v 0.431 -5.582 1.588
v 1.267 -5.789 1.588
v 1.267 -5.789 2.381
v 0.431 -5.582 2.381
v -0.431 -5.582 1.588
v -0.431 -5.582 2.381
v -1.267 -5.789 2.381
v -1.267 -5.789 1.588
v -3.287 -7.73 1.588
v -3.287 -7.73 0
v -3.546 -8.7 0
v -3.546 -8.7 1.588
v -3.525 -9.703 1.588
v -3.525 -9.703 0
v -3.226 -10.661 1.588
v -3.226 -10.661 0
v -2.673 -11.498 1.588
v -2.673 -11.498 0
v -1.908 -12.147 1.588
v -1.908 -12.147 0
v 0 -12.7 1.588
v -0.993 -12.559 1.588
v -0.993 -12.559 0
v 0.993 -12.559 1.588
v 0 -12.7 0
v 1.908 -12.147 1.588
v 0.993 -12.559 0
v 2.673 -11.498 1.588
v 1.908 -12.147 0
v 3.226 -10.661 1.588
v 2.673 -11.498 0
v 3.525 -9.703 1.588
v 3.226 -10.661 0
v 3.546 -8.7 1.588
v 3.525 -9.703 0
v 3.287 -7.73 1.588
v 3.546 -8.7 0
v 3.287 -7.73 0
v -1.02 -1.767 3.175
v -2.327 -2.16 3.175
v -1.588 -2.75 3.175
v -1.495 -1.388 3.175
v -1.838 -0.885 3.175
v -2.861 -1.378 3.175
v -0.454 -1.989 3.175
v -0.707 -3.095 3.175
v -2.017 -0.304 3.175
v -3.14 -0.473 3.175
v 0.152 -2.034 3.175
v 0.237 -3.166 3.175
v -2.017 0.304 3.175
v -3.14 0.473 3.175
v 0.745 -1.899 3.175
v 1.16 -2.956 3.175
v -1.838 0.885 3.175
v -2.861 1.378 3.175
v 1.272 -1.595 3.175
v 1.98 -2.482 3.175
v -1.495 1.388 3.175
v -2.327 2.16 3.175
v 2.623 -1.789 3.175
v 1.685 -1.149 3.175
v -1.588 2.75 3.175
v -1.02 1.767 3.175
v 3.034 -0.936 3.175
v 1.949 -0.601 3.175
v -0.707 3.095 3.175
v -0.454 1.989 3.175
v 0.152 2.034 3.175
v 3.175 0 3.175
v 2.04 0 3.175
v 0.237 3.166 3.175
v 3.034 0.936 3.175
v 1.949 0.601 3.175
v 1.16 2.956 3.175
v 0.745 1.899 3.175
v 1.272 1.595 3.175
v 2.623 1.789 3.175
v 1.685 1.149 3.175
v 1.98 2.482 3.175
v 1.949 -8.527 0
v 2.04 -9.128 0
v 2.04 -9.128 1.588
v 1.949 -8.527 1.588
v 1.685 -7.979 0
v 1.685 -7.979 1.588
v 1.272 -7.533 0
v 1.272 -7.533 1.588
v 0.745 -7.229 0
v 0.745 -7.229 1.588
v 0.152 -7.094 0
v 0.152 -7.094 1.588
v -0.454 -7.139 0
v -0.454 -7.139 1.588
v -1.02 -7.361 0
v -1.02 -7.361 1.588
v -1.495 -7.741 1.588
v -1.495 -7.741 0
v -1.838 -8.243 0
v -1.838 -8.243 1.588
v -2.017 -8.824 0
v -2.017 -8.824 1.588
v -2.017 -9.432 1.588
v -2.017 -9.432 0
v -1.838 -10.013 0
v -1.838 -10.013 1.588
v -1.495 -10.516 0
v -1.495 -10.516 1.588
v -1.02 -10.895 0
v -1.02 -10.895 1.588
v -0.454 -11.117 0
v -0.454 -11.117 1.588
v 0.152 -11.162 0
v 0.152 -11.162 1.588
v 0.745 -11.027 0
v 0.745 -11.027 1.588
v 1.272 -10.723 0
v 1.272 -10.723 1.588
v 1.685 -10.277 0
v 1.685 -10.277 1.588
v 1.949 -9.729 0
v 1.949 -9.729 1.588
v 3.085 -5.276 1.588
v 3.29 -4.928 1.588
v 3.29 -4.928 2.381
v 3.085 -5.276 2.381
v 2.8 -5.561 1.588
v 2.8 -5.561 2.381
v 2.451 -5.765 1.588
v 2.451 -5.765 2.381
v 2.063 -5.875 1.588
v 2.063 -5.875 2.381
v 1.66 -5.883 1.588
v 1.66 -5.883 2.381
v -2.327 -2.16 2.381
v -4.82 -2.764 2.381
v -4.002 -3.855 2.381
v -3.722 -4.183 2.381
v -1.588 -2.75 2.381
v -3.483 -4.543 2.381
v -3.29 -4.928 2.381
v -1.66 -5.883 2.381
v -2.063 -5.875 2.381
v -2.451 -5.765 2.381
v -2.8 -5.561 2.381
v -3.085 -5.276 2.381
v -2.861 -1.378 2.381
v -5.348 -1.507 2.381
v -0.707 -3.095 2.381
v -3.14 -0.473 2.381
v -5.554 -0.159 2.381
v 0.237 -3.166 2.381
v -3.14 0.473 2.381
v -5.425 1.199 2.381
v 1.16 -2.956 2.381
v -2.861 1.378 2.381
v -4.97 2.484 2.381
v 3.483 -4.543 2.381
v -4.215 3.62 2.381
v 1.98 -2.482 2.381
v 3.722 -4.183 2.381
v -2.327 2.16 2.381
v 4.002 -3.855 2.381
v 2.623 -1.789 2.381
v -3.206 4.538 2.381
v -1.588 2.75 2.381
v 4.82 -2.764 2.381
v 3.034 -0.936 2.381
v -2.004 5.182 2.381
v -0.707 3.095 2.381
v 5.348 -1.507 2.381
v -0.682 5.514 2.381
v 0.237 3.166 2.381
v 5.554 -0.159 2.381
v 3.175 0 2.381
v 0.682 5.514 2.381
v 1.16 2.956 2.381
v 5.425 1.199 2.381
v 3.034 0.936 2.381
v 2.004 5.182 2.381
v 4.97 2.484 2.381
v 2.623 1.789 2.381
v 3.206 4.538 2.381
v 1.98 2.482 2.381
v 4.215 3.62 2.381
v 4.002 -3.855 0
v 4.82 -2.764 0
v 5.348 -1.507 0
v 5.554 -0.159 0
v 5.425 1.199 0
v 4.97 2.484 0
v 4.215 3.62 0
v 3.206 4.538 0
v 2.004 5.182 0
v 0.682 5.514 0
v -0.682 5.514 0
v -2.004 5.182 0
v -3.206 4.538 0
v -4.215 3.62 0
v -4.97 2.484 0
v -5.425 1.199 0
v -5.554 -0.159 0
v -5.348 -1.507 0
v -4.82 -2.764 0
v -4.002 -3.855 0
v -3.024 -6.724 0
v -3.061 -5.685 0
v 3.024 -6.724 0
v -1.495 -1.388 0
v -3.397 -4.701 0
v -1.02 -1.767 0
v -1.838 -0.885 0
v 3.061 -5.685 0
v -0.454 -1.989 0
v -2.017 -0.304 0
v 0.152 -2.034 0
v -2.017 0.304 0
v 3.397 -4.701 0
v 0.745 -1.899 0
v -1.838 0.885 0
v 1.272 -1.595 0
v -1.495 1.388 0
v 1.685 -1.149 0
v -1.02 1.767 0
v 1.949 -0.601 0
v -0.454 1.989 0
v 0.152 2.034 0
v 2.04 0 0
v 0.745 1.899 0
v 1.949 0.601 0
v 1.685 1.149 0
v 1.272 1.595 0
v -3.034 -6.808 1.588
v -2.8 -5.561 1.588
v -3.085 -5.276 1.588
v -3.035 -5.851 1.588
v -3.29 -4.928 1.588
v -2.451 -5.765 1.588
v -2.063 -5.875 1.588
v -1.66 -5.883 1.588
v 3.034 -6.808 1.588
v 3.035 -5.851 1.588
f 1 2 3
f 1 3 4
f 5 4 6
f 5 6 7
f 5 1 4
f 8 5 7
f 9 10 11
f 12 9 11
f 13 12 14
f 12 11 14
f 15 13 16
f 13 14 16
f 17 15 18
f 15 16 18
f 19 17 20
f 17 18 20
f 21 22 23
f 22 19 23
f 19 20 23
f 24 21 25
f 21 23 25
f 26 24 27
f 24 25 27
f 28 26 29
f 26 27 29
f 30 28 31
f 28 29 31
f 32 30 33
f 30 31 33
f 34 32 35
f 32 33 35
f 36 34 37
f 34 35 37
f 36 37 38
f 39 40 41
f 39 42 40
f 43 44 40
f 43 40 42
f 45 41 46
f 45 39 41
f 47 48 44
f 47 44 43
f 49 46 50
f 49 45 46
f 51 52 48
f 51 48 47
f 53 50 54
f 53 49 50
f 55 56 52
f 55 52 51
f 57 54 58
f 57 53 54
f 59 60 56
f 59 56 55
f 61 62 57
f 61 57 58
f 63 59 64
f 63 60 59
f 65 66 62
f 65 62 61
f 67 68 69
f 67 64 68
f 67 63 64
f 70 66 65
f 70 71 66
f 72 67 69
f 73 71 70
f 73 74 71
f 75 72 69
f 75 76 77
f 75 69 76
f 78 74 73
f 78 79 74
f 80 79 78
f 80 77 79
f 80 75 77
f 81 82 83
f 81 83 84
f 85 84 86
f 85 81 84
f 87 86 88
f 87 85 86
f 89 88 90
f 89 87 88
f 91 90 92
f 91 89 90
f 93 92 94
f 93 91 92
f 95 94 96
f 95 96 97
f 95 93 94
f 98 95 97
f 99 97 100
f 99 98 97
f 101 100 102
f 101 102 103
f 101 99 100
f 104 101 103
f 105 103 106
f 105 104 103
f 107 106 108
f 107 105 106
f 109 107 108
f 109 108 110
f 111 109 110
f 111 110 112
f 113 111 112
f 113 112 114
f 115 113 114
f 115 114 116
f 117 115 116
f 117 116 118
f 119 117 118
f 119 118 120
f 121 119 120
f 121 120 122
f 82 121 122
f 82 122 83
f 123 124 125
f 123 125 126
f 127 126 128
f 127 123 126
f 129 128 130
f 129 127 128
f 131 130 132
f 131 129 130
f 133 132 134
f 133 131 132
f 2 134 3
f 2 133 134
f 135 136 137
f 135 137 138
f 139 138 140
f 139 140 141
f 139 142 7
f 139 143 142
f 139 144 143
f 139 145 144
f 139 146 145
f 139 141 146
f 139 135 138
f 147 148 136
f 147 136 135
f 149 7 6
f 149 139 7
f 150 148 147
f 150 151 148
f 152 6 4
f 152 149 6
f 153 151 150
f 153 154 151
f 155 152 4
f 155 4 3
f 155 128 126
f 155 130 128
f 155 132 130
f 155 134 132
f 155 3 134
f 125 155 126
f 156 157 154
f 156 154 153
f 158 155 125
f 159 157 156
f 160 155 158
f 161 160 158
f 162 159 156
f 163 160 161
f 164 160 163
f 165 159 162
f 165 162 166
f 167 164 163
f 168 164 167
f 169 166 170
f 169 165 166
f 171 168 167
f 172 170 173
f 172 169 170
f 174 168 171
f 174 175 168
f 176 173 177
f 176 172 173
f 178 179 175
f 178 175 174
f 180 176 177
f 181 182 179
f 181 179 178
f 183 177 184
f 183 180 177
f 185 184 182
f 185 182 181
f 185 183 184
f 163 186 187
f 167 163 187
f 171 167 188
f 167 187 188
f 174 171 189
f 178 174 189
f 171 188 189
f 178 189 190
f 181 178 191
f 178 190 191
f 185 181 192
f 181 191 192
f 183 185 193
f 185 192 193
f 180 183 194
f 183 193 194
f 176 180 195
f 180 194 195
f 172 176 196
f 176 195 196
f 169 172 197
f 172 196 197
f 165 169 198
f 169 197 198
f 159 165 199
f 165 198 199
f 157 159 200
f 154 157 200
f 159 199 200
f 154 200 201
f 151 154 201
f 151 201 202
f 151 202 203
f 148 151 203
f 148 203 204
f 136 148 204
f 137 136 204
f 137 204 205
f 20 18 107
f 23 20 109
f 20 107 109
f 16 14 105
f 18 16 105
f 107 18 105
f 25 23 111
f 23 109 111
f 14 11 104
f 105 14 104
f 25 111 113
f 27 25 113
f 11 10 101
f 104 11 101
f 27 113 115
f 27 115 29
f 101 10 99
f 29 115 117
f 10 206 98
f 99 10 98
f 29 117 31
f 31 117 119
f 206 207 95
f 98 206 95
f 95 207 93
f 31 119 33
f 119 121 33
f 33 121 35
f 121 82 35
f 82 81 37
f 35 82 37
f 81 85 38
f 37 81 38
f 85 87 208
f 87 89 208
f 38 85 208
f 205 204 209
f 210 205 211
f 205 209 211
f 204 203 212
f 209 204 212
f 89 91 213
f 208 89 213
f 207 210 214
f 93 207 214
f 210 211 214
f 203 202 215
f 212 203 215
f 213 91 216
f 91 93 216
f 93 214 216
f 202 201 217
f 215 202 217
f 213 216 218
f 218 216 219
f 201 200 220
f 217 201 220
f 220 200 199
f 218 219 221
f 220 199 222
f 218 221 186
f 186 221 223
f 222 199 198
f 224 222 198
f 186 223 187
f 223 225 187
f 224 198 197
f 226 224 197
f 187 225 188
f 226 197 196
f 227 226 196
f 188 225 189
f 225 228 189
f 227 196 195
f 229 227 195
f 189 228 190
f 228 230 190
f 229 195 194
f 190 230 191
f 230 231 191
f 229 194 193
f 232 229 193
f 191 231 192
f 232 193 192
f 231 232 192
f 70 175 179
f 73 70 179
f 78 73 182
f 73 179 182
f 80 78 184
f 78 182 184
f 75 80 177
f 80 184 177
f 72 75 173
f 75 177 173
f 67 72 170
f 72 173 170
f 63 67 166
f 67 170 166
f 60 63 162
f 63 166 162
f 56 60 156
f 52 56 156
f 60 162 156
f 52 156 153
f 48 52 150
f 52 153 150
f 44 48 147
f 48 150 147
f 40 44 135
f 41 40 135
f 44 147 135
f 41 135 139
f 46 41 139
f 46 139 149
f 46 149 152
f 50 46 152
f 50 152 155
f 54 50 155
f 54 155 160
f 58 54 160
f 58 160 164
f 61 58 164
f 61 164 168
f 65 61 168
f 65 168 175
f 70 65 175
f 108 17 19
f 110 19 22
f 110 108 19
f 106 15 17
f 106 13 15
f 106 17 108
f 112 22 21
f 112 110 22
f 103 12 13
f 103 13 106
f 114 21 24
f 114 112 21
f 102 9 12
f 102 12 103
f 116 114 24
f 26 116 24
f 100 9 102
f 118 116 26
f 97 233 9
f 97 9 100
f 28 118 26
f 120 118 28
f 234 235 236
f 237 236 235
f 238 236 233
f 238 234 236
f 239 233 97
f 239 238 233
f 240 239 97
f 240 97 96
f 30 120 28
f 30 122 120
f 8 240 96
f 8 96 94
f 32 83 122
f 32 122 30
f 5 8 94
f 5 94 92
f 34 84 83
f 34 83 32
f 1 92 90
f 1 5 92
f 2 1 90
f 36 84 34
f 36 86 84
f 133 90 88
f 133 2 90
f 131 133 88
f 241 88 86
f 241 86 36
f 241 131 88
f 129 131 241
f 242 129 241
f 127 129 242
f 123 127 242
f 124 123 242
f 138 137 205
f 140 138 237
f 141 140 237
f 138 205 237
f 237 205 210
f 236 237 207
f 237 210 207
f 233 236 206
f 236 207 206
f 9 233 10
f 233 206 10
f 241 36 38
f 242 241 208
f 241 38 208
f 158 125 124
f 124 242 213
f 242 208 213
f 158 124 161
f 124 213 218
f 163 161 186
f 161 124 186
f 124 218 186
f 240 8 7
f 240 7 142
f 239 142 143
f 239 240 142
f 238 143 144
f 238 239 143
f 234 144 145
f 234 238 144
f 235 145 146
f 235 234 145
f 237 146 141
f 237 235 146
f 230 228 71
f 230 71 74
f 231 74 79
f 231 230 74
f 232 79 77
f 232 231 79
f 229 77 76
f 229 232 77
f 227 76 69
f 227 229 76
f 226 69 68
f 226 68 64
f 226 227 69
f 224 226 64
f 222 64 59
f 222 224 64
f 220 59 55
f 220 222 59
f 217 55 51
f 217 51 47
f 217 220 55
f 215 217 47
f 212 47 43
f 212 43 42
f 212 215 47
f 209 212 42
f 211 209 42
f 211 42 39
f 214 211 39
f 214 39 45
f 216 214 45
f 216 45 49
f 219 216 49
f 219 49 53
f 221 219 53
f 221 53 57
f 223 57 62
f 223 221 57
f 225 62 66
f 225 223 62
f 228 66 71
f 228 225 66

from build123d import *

# Parameters (mm, degrees)
SKETCH2_R           = 3.175
SKETCH2_R_2         = 2.0399375
BOSS_EXTRUDE1_DEPTH = 2.38125
SKETCH2_6_R         = 3.175
SKETCH2_6_R_2       = 2.0399375
BOSS_EXTRUDE2_DEPTH = 3.175
CUT_EXTRUDE1_START  = -0.79375
SKETCH3_R           = 3.571875
SKETCH3_R_2         = 2.0399375
CUT_EXTRUDE1_DEPTH  = 0.79375
FILLET1_START       = 1.5875
FILLET1_DEPTH       = 0.79375


with BuildPart() as part:
    # Sketch2 → Boss-Extrude1 (new body)
    with BuildSketch(Plane.XY):
        with BuildLine():
            ThreePointArc((-4.001636369, -3.854714053), (-3.061446657, -5.68510333), (-3.28705844, -7.730434825))
            ThreePointArc((-3.28705844, -7.730434825), (3.2e-08, -12.7), (3.287058415, -7.730434766))
            ThreePointArc((3.287058415, -7.730434766), (3.061446657, -5.685103331), (4.001636324, -3.8547141))
            ThreePointArc((4.001636324, -3.8547141), (3.3e-08, 5.55625), (-4.001636369, -3.854714053))
        make_face()
        Circle(SKETCH2_R, mode=Mode.SUBTRACT)
        with Locations((0, -9.128125)):
            Circle(SKETCH2_R_2, mode=Mode.SUBTRACT)
    extrude(amount=BOSS_EXTRUDE1_DEPTH)

    # Sketch2<6> → Boss-Extrude2 (add)
    with BuildSketch(Plane.XY):
        Circle(SKETCH2_6_R)
        Circle(SKETCH2_6_R_2, mode=Mode.SUBTRACT)
    extrude(amount=BOSS_EXTRUDE2_DEPTH)

    # Sketch3 → Cut-Extrude1 (cut)
    with BuildSketch(Plane.XY.offset(2.38125).offset(CUT_EXTRUDE1_START)):
        with Locations((0, -9.128125)):
            Circle(SKETCH3_R)
        with Locations((0, -9.128125)):
            Circle(SKETCH3_R_2, mode=Mode.SUBTRACT)
    extrude(amount=CUT_EXTRUDE1_DEPTH, mode=Mode.SUBTRACT)

    # Fillet1: read off the stored shape, not the designer's step
    # Fillet1 outline → Fillet1 (cut)
    with BuildSketch(Plane.XY.offset(FILLET1_START)):
        with BuildLine():
            ThreePointArc((-3.287058422, -7.730434783), (-2.475434769, -6.553146608), (-1.267079181, -5.788543984))
            ThreePointArc((-1.267079181, -5.788543984), (-2.451421136, -5.765200609), (-3.289884364, -4.928426927))
            ThreePointArc((-3.289884364, -4.928426927), (-3.002243662, -6.329142182), (-3.287058422, -7.730434783))
        make_face()
        with BuildLine():
            ThreePointArc((3.289884364, -4.928426927), (2.451421136, -5.765200609), (1.267079181, -5.788543984))
            ThreePointArc((1.267079181, -5.788543984), (2.475434769, -6.553146608), (3.287058422, -7.730434783))
            ThreePointArc((3.287058422, -7.730434783), (3.002243662, -6.329142182), (3.289884364, -4.928426927))
        make_face()
    extrude(amount=FILLET1_DEPTH, mode=Mode.SUBTRACT)


solid = part.part
